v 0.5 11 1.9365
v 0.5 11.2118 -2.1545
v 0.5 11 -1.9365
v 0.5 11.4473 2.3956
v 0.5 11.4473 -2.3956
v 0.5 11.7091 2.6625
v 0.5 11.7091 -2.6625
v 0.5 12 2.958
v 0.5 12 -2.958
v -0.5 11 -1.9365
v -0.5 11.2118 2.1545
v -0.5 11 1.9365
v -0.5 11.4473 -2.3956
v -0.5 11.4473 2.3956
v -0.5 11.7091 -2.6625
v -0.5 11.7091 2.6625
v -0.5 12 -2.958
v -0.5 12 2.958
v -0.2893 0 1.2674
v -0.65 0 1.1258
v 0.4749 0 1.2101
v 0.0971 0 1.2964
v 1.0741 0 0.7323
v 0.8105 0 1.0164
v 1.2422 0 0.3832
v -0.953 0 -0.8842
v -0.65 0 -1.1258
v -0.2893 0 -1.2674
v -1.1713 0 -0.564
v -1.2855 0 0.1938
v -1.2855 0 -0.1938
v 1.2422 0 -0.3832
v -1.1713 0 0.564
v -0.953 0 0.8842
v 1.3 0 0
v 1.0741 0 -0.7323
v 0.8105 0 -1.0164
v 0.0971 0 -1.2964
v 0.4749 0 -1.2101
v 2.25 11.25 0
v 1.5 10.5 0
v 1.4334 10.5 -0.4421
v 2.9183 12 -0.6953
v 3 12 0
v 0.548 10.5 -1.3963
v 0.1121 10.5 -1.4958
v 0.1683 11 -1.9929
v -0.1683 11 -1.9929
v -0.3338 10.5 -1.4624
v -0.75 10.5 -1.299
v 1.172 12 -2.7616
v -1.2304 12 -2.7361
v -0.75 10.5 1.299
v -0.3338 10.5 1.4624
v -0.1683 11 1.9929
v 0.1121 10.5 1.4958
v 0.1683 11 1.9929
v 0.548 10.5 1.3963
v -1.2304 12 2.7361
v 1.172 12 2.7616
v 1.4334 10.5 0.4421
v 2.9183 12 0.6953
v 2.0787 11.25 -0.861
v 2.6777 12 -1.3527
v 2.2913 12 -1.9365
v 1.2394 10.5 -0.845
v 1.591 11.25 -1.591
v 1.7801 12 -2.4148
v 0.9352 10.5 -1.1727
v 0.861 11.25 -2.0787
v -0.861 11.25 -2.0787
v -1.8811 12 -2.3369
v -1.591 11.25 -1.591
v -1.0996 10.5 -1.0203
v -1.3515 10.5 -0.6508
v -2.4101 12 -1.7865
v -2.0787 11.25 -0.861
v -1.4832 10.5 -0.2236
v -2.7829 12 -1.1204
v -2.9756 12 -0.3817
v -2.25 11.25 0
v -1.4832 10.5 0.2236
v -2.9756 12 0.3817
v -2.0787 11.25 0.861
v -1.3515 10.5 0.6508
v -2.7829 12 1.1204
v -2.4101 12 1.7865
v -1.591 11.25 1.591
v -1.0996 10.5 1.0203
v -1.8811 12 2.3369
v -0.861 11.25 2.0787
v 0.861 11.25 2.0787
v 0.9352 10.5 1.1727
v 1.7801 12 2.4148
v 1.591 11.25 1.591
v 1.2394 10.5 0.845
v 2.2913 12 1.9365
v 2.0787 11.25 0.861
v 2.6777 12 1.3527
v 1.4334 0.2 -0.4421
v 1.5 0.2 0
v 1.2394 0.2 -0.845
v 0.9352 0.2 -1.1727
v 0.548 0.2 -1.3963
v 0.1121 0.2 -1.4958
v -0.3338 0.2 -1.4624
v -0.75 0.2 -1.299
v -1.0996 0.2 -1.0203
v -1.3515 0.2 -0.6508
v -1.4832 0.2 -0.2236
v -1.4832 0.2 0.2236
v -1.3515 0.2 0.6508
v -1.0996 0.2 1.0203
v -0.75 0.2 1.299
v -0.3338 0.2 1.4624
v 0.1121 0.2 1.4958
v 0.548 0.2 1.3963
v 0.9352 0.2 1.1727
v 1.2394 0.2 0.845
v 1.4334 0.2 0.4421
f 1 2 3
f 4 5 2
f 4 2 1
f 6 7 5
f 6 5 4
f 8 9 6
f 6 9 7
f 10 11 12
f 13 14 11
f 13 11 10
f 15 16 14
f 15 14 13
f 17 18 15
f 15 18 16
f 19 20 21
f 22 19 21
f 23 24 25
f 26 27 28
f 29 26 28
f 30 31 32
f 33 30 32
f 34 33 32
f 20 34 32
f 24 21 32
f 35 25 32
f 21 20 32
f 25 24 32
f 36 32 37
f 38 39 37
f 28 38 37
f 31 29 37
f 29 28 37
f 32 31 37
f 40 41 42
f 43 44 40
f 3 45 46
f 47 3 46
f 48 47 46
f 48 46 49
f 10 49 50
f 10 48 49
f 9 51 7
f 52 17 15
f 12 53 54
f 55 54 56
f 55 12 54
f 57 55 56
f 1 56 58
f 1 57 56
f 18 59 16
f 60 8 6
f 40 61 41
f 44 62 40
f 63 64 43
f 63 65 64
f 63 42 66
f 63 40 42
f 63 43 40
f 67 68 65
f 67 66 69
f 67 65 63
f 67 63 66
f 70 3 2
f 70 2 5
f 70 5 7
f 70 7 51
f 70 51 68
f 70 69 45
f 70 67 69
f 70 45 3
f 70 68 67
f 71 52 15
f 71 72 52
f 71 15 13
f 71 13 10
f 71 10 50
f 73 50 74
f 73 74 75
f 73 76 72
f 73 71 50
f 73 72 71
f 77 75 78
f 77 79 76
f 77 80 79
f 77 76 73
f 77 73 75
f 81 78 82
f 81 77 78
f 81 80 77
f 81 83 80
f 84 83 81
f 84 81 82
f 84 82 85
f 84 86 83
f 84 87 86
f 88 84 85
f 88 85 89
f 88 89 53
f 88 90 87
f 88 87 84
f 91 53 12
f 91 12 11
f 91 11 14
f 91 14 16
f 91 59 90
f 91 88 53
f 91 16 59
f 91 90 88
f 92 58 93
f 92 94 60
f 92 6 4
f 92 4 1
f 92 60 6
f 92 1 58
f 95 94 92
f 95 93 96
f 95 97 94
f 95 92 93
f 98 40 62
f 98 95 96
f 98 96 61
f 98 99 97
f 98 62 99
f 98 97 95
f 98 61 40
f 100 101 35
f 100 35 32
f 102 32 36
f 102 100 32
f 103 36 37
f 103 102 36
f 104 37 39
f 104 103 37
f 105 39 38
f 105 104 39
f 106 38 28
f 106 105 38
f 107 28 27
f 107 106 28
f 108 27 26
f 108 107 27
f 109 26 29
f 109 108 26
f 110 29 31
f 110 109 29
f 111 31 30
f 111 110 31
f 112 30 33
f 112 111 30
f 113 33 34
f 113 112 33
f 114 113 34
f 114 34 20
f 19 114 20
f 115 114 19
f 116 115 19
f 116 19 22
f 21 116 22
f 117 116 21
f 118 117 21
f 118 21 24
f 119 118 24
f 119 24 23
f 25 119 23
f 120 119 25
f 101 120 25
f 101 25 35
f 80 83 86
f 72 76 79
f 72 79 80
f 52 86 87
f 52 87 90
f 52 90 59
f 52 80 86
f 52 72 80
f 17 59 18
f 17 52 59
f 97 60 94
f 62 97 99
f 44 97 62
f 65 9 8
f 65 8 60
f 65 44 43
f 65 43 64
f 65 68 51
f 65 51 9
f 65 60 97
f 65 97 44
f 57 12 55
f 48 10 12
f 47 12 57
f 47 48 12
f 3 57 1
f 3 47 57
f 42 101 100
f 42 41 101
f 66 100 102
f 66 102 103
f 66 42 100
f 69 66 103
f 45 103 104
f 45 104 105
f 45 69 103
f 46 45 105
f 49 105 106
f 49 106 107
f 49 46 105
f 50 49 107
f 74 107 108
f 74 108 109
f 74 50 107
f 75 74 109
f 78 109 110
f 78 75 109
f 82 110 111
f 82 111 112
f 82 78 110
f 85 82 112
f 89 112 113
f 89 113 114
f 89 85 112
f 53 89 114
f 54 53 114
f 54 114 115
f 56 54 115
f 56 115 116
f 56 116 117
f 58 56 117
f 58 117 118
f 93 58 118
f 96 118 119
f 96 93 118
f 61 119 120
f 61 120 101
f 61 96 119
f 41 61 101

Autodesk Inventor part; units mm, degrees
ref_plane "YZ Plane" through (0, 0, 0) normal (1, 0, 0) x (0, 1, 0)
ref_plane "XZ Plane" through (0, 0, 0) normal (0, 1, 0) x (-1, 0, 0)
ref_plane "XY Plane" through (0, 0, 0) normal (0, 0, 1) x (1, 0, 0)
sketch "Sketch1" plane through (0, 0, 0) normal (0, 0, 1) x (1, 0, 0)
  line L0 (0, 0) -> (1.5, 0)
  line L1 (1.5, 0) -> (1.5, 10.5)
  line L2 (1.5, 10.5) -> (3, 12)
  line L3 (3, 12) -> (0, 12)
  line L4 (0, 12) -> (0, 0)
  line L5 (0, -2.4) -> (0, 14.4) projected
  dimension "d2" = 1.5
  dimension "d3" = 12
  dimension "d6" = 0
  dimension "d7" = 0
  dimension "d8" = 45
  dimension "d9" = 3
revolve "Revolution1" add sketch "Sketch1" angle 360 about axis through (0, -10, 0) along (0, 1, 0)
sketch "Sketch2" plane through (0, 12, 0) normal (0, 1, 0) x (1, 0, 0)
  circle A0 centre (0, 0) radius 3 projected
  line L0 (-0.5, 5.0208) -> (0.5, 5.0208)
  line L1 (0.5, 5.0208) -> (0.5, -4.425)
  line L2 (0.5, -4.425) -> (-0.5, -4.425)
  line L3 (-0.5, -4.425) -> (-0.5, 5.0208)
  dimension "d10" = 1
  dimension "d11" = 0.5
extrude "Extrusion1" cut sketch "Sketch2" against normal blind 1 contours L1 A0 L3 | A0 L3 L0 L1 | L1 L2 L3 A0
thread "Thread2" size "M3x0.5" class "6g" standard "ANSI Metric M Profile" full length
chamfer "Chamfer1" distance 0.2 angle 45 1 edges at (-1.5, 0, 0)
equation "\"d11\" = 0.5 * d10"
properties part number "XGEN_M3_screw"
